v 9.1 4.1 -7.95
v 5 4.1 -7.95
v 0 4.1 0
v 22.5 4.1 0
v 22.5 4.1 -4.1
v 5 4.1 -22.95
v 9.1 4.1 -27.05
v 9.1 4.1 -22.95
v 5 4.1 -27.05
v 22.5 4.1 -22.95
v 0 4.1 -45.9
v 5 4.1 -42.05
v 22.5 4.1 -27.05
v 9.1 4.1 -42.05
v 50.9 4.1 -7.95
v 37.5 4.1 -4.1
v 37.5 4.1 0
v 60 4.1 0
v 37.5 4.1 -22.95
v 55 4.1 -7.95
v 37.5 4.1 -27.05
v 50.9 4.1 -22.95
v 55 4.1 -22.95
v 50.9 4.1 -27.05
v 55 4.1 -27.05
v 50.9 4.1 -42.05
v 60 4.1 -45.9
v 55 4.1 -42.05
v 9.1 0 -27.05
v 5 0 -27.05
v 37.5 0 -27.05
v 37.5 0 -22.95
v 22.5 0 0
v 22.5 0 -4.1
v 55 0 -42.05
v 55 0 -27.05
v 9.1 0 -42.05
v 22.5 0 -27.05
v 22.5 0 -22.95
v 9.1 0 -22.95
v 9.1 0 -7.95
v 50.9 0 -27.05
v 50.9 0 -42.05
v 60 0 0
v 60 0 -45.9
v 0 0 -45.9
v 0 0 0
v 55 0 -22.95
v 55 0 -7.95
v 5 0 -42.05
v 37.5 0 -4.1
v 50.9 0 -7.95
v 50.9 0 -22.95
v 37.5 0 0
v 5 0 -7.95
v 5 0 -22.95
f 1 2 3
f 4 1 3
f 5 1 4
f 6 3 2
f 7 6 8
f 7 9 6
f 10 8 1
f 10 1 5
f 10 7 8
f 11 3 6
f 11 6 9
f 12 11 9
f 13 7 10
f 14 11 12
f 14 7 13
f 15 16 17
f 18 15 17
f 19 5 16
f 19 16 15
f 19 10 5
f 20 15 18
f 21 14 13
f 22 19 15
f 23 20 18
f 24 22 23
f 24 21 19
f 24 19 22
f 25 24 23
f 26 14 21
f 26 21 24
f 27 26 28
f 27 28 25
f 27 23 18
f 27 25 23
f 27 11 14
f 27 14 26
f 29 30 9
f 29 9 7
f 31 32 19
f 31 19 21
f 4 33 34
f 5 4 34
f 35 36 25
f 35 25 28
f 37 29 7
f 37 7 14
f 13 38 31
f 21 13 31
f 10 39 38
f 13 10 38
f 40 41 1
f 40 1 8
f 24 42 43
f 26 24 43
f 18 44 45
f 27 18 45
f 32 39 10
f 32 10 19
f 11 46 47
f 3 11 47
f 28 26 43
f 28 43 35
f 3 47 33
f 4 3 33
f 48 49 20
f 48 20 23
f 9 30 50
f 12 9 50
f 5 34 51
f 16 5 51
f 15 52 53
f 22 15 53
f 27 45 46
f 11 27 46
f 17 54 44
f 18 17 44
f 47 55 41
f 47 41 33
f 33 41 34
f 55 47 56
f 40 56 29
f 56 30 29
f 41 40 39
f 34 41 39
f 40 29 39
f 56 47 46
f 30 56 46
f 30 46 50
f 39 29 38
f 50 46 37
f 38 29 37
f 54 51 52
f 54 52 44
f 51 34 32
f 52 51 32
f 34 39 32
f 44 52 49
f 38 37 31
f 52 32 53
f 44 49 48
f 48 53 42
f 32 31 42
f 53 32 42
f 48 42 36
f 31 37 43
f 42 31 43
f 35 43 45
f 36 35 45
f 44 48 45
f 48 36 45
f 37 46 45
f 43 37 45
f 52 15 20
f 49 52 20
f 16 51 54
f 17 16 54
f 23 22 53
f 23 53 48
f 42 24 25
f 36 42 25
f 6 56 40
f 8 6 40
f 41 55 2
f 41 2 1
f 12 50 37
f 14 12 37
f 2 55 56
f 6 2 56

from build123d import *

# Parameters (mm, degrees)
SKETCH1_W           = 4.1
SKETCH1_H           = 15
SKETCH1_W_2         = 15
SKETCH1_H_2         = 4.1
BOSS_EXTRUDE1_DEPTH = 4.1


with BuildPart() as part:
    # Sketch1 → Boss-Extrude1 (new body)
    with BuildSketch(Plane(origin=(0, 0, 0), x_dir=(1, 0, 0), z_dir=(0, 1, 0))):
        Polygon((0, 45.9), (0, 0), (22.5, 0), (22.5, 4.1), (37.5, 4.1), (37.5, 0), (60, 0), (60, 45.9), align=None)
        with Locations((7.05, 34.55)):
            Rectangle(SKETCH1_W, SKETCH1_H, mode=Mode.SUBTRACT)
        with Locations((7.05, 15.45)):
            Rectangle(SKETCH1_W, SKETCH1_H, mode=Mode.SUBTRACT)
        with Locations((52.95, 34.55)):
            Rectangle(SKETCH1_W, SKETCH1_H, mode=Mode.SUBTRACT)
        with Locations((52.95, 15.45)):
            Rectangle(SKETCH1_W, SKETCH1_H, mode=Mode.SUBTRACT)
        with Locations((30, 25)):
            Rectangle(SKETCH1_W_2, SKETCH1_H_2, mode=Mode.SUBTRACT)
    extrude(amount=BOSS_EXTRUDE1_DEPTH)


solid = part.part
